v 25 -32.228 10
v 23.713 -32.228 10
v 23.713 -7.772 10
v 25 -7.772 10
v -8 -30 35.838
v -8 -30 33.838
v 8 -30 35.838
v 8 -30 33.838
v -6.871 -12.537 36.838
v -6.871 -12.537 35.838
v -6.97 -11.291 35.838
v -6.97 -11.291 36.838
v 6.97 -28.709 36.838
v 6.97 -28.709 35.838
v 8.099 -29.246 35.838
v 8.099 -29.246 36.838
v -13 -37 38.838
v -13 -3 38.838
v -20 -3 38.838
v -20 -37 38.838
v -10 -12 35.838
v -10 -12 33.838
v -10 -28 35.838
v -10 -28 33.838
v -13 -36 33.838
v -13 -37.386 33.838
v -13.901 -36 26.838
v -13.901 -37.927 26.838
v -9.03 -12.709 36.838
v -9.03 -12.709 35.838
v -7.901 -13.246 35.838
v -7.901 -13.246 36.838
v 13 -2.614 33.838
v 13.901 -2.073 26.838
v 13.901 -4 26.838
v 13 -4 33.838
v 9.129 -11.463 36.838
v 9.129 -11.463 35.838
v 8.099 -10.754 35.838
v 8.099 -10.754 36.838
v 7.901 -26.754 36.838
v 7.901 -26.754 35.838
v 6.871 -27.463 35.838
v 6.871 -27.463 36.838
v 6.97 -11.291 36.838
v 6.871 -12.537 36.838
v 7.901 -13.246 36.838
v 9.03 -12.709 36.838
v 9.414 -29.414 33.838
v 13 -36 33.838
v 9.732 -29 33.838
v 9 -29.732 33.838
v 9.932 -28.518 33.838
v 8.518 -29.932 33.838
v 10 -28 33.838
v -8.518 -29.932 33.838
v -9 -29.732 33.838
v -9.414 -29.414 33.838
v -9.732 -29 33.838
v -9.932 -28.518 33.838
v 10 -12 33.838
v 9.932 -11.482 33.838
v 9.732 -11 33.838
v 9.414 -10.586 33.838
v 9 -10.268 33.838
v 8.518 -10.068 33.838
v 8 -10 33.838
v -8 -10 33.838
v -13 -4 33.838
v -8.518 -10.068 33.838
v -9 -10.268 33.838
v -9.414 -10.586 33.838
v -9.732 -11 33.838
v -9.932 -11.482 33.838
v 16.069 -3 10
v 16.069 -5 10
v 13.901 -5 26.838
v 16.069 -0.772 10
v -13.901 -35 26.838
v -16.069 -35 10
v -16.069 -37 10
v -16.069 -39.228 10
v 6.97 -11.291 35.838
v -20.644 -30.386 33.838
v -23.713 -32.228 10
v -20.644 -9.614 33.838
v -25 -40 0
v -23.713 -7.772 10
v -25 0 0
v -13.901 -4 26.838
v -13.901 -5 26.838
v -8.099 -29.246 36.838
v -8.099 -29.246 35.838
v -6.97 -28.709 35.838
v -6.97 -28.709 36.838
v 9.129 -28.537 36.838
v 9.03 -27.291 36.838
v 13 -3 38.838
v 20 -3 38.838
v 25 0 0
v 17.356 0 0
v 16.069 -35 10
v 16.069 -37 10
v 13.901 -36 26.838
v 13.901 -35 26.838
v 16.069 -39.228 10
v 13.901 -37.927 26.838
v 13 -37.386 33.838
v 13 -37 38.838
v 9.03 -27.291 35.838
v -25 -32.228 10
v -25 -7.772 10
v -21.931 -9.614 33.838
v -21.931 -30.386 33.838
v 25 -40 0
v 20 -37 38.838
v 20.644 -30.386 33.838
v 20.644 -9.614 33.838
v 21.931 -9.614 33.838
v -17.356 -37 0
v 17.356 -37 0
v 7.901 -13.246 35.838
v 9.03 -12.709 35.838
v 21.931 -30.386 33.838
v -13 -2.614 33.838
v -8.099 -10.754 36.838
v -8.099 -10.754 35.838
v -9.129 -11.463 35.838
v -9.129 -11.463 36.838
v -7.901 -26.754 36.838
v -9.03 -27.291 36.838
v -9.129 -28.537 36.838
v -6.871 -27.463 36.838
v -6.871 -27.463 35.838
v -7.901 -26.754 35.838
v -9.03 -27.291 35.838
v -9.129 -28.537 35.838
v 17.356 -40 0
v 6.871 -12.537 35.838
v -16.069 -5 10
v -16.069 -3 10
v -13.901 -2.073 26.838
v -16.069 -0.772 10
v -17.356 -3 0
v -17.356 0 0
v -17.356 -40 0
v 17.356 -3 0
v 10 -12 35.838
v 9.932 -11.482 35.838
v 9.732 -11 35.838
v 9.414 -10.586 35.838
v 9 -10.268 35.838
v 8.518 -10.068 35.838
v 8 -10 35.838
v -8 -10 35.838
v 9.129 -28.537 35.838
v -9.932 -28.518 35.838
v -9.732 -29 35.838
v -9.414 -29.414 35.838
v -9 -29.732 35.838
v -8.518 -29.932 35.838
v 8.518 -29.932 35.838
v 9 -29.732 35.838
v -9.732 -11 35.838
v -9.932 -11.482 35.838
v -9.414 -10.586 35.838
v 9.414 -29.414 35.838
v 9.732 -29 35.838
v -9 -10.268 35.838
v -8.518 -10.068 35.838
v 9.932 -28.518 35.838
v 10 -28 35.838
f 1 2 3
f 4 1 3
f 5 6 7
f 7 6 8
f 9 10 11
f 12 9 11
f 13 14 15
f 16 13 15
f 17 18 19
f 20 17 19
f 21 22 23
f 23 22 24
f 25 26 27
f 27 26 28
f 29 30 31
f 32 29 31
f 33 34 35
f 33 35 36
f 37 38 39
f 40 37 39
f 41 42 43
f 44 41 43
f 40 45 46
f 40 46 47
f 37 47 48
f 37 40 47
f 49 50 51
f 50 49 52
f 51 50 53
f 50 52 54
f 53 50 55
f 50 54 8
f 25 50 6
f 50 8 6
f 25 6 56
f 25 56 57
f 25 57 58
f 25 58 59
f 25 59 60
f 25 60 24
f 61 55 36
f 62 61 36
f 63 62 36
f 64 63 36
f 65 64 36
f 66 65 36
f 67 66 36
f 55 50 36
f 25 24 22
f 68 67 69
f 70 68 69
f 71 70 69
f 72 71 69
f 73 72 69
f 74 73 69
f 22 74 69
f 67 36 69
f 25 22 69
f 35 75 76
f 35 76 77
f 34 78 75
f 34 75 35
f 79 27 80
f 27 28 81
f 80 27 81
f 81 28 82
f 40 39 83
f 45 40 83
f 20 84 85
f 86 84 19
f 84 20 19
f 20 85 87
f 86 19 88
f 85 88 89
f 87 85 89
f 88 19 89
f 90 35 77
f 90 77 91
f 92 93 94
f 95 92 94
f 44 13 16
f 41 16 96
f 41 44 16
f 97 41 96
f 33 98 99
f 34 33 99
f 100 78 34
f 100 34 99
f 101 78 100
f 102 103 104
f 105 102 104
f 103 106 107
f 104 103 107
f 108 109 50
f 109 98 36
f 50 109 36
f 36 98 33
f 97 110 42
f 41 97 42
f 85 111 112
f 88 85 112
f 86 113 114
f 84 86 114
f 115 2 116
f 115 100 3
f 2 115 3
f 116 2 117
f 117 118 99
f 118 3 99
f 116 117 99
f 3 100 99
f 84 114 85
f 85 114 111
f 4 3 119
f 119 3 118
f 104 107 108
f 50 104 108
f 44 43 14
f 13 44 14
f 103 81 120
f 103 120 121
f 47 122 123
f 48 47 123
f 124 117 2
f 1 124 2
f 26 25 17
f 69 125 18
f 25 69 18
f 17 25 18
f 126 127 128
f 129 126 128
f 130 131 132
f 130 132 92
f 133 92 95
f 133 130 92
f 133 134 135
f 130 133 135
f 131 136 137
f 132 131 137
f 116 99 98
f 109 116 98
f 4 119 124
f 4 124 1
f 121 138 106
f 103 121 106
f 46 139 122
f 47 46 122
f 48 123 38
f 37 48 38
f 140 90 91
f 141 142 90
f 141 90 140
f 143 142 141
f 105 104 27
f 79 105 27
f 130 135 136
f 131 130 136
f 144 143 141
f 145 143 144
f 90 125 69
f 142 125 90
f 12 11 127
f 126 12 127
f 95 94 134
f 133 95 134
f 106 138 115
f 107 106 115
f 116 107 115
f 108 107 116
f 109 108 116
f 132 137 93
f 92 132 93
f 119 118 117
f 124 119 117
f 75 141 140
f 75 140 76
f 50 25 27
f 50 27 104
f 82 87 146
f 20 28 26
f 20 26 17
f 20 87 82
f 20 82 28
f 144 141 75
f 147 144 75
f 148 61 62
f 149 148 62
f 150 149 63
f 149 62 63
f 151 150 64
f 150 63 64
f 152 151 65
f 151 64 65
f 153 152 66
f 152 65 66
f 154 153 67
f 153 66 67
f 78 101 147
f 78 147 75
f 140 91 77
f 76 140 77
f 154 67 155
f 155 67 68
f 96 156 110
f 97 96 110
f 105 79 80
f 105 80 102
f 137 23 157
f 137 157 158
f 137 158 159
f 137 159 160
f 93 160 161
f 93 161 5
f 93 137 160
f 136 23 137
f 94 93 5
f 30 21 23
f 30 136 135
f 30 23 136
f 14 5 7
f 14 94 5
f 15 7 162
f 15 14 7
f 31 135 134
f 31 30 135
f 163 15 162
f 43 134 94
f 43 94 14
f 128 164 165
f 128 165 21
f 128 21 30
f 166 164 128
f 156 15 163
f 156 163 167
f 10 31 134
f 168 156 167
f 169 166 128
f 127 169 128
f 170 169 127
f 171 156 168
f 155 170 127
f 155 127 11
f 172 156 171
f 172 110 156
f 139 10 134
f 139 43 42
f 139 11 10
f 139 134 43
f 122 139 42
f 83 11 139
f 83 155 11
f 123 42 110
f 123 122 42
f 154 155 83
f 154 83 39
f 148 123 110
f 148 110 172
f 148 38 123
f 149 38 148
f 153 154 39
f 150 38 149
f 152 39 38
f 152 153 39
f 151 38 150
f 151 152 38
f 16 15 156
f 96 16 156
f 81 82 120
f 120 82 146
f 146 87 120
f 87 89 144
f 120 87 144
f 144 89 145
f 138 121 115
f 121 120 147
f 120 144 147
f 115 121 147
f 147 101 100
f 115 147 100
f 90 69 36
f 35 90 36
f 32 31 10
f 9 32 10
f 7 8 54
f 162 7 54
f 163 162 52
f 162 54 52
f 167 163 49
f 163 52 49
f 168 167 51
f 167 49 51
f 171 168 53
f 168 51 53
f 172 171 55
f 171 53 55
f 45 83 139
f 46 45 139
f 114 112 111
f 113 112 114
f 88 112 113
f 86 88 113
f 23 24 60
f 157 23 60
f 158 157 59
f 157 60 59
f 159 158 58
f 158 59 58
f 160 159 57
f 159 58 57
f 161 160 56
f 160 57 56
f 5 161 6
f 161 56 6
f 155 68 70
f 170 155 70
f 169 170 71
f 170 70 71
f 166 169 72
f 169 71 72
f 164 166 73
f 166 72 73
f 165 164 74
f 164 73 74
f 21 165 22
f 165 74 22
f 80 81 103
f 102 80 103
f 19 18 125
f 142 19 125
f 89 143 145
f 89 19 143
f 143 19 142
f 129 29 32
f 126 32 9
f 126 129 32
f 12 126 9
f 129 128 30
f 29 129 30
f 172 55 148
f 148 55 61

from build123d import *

# Parameters (mm, degrees)
F1_DEPTH  = 40
F2_DEPTH  = 4
F3_DEPTH  = 3
F4_DEPTH  = 5
F6_DEPTH  = 4
F7_DEPTH  = 3
F8_DEPTH  = 5
F10_DEPTH = 2
F13_DEPTH = 50
F15_DEPTH = 1
F16_DEPTH = 50
F17_DEPTH = 40


# Not quite as in the source:
# - ends of sketch curves that miss each other by under 0.0002 mm in the source are joined


with BuildPart() as f1:
    # F0 (on Front) → F1 (new body)
    with BuildSketch(Plane.XZ):
        Polygon((-20, 38.838), (-25, 0), (-17.3563005304, 0), (-16.0689015912, 10), (-13.9011792574, 26.838), (-13, 33.838), (-13, 38.838), align=None)
        Polygon((-16.0689015912, 10), (-17.3563005304, 0), (17.3563005304, 0), (16.0689015912, 10), (0, 10), align=None)
        Polygon((-13.9011792574, 26.838), (-16.0689015912, 10), (0, 10), (16.0689015912, 10), (13.9011792574, 26.838), (-3.37943e-05, 26.838), align=None)
        Polygon((-13, 33.838), (-13.9011792574, 26.838), (3.37943e-05, 26.838), (13.9011792574, 26.838), (13, 33.838), (0, 33.838), align=None)
        Polygon((16.0689015912, 10), (17.3563005304, 0), (25, 0), (20, 38.838), (13, 38.838), (13, 33.838), (13.9011792574, 26.838), align=None)
    extrude(amount=F1_DEPTH)

    # F0 (on Front) → F2 (cut)
    with BuildSketch(Plane.XZ):
        Polygon((-13, 33.838), (-13.9011792574, 26.838), (3.37943e-05, 26.838), (13.9011792574, 26.838), (13, 33.838), (0, 33.838), align=None)
    extrude(amount=F2_DEPTH, mode=Mode.SUBTRACT)

    # F0 (on Front) → F3 (cut)
    with BuildSketch(Plane.XZ):
        Polygon((-16.0689015912, 10), (-17.3563005304, 0), (17.3563005304, 0), (16.0689015912, 10), (0, 10), align=None)
    extrude(amount=F3_DEPTH, mode=Mode.SUBTRACT)

    # F0 (on Front) → F4 (cut)
    with BuildSketch(Plane.XZ):
        Polygon((-13.9011792574, 26.838), (-16.0689015912, 10), (0, 10), (16.0689015912, 10), (13.9011792574, 26.838), (-3.37943e-05, 26.838), align=None)
    extrude(amount=F4_DEPTH, mode=Mode.SUBTRACT)

    # F5 (on face) → F6 (cut)
    with BuildSketch(Plane.XZ.offset(40)):
        Polygon((-13, 33.838), (-13.9011792574, 26.838), (3.37943e-05, 26.838), (13.9011792574, 26.838), (13, 33.838), (0, 33.838), align=None)
    extrude(amount=-F6_DEPTH, mode=Mode.SUBTRACT)

    # F5 (on face) → F7 (cut)
    with BuildSketch(Plane.XZ.offset(40)):
        Polygon((-16.0689015912, 10), (-17.3563005304, 0), (17.3563005304, 0), (16.0689015912, 10), (0, 10), align=None)
    extrude(amount=-F7_DEPTH, mode=Mode.SUBTRACT)

    # F5 (on face) → F8 (cut)
    with BuildSketch(Plane.XZ.offset(40)):
        Polygon((-13.9011792574, 26.838), (-16.0689015912, 10), (0, 10), (16.0689015912, 10), (13.9011792574, 26.838), (-3.37943e-05, 26.838), align=None)
    extrude(amount=-F8_DEPTH, mode=Mode.SUBTRACT)

    # F9 (on face) → F10 (join)
    with BuildSketch(Plane.XY.offset(33.838)):
        with BuildLine():
            ThreePointArc((-10, -28), (-9.4142135624, -29.4142135624), (-8, -30))
            Line((-8, -30), (8, -30))
            ThreePointArc((8, -30), (9.4142135624, -29.4142135624), (10, -28))
            Line((10, -28), (10, -12))
            ThreePointArc((10, -12), (9.4142135624, -10.5857864376), (8, -10))
            Line((8, -10), (-8, -10))
            ThreePointArc((-8, -10), (-9.4142135624, -10.5857864376), (-10, -12))
            Line((-10, -12), (-10, -28))
        make_face()
    extrude(amount=F10_DEPTH)

    # F12 (on face) → F13 (cut)
    with BuildSketch(Plane.YZ.offset(-25)):
        Polygon((-3, 38.838), (0, 0), (0, 38.838), align=None)
        Polygon((-40, 38.838), (-40, 0), (-37, 38.838), align=None)
    extrude(amount=F13_DEPTH, mode=Mode.SUBTRACT)

    # F14 (on face) → F15 (join)
    with BuildSketch(Plane.XY.offset(35.838)):
        Polygon((-7.9011683363, -13.2460867956), (-6.8714413478, -12.5374526663), (-6.9702730115, -11.2913658707), (-8.0988316637, -10.7539132044), (-9.1285586522, -11.4625473337), (-9.0297269885, -12.7086341293), align=None)
        Polygon((6.9702730115, -11.2913658707), (6.8714413478, -12.5374526663), (7.9011683363, -13.2460867956), (9.0297269885, -12.7086341293), (9.1285586522, -11.4625473337), (8.0988316637, -10.7539132044), align=None)
        Polygon((7.9011683363, -26.7539132044), (6.8714413478, -27.4625473337), (6.9702730115, -28.7086341293), (8.0988316637, -29.2460867956), (9.1285586522, -28.5374526663), (9.0297269885, -27.2913658707), align=None)
        Polygon((-6.9702730115, -28.7086341293), (-6.8714413478, -27.4625473337), (-7.9011683363, -26.7539132044), (-9.0297269885, -27.2913658707), (-9.1285586522, -28.5374526663), (-8.0988316637, -29.2460867956), align=None)
    extrude(amount=F15_DEPTH)

    # F12 (on face) → F16 (join)
    with BuildSketch(Plane.YZ.offset(-25)):
        Polygon((-20, 33.838), (-30.3862196818, 33.838), (-32.2275606365, 10), (-20, 10), (-7.7724393635, 10), (-9.6137803182, 33.838), align=None)
    extrude(amount=F16_DEPTH)

    # F0 (on Front) → F17 (cut)
    with BuildSketch(Plane.XZ):
        Polygon((-25, 38.838), (-25, 10), (-21.2873989392, 38.838), align=None)
        Polygon((21.2873989392, 38.838), (25, 10), (25, 38.838), align=None)
    extrude(amount=F17_DEPTH, mode=Mode.SUBTRACT)


solid = f1.part
